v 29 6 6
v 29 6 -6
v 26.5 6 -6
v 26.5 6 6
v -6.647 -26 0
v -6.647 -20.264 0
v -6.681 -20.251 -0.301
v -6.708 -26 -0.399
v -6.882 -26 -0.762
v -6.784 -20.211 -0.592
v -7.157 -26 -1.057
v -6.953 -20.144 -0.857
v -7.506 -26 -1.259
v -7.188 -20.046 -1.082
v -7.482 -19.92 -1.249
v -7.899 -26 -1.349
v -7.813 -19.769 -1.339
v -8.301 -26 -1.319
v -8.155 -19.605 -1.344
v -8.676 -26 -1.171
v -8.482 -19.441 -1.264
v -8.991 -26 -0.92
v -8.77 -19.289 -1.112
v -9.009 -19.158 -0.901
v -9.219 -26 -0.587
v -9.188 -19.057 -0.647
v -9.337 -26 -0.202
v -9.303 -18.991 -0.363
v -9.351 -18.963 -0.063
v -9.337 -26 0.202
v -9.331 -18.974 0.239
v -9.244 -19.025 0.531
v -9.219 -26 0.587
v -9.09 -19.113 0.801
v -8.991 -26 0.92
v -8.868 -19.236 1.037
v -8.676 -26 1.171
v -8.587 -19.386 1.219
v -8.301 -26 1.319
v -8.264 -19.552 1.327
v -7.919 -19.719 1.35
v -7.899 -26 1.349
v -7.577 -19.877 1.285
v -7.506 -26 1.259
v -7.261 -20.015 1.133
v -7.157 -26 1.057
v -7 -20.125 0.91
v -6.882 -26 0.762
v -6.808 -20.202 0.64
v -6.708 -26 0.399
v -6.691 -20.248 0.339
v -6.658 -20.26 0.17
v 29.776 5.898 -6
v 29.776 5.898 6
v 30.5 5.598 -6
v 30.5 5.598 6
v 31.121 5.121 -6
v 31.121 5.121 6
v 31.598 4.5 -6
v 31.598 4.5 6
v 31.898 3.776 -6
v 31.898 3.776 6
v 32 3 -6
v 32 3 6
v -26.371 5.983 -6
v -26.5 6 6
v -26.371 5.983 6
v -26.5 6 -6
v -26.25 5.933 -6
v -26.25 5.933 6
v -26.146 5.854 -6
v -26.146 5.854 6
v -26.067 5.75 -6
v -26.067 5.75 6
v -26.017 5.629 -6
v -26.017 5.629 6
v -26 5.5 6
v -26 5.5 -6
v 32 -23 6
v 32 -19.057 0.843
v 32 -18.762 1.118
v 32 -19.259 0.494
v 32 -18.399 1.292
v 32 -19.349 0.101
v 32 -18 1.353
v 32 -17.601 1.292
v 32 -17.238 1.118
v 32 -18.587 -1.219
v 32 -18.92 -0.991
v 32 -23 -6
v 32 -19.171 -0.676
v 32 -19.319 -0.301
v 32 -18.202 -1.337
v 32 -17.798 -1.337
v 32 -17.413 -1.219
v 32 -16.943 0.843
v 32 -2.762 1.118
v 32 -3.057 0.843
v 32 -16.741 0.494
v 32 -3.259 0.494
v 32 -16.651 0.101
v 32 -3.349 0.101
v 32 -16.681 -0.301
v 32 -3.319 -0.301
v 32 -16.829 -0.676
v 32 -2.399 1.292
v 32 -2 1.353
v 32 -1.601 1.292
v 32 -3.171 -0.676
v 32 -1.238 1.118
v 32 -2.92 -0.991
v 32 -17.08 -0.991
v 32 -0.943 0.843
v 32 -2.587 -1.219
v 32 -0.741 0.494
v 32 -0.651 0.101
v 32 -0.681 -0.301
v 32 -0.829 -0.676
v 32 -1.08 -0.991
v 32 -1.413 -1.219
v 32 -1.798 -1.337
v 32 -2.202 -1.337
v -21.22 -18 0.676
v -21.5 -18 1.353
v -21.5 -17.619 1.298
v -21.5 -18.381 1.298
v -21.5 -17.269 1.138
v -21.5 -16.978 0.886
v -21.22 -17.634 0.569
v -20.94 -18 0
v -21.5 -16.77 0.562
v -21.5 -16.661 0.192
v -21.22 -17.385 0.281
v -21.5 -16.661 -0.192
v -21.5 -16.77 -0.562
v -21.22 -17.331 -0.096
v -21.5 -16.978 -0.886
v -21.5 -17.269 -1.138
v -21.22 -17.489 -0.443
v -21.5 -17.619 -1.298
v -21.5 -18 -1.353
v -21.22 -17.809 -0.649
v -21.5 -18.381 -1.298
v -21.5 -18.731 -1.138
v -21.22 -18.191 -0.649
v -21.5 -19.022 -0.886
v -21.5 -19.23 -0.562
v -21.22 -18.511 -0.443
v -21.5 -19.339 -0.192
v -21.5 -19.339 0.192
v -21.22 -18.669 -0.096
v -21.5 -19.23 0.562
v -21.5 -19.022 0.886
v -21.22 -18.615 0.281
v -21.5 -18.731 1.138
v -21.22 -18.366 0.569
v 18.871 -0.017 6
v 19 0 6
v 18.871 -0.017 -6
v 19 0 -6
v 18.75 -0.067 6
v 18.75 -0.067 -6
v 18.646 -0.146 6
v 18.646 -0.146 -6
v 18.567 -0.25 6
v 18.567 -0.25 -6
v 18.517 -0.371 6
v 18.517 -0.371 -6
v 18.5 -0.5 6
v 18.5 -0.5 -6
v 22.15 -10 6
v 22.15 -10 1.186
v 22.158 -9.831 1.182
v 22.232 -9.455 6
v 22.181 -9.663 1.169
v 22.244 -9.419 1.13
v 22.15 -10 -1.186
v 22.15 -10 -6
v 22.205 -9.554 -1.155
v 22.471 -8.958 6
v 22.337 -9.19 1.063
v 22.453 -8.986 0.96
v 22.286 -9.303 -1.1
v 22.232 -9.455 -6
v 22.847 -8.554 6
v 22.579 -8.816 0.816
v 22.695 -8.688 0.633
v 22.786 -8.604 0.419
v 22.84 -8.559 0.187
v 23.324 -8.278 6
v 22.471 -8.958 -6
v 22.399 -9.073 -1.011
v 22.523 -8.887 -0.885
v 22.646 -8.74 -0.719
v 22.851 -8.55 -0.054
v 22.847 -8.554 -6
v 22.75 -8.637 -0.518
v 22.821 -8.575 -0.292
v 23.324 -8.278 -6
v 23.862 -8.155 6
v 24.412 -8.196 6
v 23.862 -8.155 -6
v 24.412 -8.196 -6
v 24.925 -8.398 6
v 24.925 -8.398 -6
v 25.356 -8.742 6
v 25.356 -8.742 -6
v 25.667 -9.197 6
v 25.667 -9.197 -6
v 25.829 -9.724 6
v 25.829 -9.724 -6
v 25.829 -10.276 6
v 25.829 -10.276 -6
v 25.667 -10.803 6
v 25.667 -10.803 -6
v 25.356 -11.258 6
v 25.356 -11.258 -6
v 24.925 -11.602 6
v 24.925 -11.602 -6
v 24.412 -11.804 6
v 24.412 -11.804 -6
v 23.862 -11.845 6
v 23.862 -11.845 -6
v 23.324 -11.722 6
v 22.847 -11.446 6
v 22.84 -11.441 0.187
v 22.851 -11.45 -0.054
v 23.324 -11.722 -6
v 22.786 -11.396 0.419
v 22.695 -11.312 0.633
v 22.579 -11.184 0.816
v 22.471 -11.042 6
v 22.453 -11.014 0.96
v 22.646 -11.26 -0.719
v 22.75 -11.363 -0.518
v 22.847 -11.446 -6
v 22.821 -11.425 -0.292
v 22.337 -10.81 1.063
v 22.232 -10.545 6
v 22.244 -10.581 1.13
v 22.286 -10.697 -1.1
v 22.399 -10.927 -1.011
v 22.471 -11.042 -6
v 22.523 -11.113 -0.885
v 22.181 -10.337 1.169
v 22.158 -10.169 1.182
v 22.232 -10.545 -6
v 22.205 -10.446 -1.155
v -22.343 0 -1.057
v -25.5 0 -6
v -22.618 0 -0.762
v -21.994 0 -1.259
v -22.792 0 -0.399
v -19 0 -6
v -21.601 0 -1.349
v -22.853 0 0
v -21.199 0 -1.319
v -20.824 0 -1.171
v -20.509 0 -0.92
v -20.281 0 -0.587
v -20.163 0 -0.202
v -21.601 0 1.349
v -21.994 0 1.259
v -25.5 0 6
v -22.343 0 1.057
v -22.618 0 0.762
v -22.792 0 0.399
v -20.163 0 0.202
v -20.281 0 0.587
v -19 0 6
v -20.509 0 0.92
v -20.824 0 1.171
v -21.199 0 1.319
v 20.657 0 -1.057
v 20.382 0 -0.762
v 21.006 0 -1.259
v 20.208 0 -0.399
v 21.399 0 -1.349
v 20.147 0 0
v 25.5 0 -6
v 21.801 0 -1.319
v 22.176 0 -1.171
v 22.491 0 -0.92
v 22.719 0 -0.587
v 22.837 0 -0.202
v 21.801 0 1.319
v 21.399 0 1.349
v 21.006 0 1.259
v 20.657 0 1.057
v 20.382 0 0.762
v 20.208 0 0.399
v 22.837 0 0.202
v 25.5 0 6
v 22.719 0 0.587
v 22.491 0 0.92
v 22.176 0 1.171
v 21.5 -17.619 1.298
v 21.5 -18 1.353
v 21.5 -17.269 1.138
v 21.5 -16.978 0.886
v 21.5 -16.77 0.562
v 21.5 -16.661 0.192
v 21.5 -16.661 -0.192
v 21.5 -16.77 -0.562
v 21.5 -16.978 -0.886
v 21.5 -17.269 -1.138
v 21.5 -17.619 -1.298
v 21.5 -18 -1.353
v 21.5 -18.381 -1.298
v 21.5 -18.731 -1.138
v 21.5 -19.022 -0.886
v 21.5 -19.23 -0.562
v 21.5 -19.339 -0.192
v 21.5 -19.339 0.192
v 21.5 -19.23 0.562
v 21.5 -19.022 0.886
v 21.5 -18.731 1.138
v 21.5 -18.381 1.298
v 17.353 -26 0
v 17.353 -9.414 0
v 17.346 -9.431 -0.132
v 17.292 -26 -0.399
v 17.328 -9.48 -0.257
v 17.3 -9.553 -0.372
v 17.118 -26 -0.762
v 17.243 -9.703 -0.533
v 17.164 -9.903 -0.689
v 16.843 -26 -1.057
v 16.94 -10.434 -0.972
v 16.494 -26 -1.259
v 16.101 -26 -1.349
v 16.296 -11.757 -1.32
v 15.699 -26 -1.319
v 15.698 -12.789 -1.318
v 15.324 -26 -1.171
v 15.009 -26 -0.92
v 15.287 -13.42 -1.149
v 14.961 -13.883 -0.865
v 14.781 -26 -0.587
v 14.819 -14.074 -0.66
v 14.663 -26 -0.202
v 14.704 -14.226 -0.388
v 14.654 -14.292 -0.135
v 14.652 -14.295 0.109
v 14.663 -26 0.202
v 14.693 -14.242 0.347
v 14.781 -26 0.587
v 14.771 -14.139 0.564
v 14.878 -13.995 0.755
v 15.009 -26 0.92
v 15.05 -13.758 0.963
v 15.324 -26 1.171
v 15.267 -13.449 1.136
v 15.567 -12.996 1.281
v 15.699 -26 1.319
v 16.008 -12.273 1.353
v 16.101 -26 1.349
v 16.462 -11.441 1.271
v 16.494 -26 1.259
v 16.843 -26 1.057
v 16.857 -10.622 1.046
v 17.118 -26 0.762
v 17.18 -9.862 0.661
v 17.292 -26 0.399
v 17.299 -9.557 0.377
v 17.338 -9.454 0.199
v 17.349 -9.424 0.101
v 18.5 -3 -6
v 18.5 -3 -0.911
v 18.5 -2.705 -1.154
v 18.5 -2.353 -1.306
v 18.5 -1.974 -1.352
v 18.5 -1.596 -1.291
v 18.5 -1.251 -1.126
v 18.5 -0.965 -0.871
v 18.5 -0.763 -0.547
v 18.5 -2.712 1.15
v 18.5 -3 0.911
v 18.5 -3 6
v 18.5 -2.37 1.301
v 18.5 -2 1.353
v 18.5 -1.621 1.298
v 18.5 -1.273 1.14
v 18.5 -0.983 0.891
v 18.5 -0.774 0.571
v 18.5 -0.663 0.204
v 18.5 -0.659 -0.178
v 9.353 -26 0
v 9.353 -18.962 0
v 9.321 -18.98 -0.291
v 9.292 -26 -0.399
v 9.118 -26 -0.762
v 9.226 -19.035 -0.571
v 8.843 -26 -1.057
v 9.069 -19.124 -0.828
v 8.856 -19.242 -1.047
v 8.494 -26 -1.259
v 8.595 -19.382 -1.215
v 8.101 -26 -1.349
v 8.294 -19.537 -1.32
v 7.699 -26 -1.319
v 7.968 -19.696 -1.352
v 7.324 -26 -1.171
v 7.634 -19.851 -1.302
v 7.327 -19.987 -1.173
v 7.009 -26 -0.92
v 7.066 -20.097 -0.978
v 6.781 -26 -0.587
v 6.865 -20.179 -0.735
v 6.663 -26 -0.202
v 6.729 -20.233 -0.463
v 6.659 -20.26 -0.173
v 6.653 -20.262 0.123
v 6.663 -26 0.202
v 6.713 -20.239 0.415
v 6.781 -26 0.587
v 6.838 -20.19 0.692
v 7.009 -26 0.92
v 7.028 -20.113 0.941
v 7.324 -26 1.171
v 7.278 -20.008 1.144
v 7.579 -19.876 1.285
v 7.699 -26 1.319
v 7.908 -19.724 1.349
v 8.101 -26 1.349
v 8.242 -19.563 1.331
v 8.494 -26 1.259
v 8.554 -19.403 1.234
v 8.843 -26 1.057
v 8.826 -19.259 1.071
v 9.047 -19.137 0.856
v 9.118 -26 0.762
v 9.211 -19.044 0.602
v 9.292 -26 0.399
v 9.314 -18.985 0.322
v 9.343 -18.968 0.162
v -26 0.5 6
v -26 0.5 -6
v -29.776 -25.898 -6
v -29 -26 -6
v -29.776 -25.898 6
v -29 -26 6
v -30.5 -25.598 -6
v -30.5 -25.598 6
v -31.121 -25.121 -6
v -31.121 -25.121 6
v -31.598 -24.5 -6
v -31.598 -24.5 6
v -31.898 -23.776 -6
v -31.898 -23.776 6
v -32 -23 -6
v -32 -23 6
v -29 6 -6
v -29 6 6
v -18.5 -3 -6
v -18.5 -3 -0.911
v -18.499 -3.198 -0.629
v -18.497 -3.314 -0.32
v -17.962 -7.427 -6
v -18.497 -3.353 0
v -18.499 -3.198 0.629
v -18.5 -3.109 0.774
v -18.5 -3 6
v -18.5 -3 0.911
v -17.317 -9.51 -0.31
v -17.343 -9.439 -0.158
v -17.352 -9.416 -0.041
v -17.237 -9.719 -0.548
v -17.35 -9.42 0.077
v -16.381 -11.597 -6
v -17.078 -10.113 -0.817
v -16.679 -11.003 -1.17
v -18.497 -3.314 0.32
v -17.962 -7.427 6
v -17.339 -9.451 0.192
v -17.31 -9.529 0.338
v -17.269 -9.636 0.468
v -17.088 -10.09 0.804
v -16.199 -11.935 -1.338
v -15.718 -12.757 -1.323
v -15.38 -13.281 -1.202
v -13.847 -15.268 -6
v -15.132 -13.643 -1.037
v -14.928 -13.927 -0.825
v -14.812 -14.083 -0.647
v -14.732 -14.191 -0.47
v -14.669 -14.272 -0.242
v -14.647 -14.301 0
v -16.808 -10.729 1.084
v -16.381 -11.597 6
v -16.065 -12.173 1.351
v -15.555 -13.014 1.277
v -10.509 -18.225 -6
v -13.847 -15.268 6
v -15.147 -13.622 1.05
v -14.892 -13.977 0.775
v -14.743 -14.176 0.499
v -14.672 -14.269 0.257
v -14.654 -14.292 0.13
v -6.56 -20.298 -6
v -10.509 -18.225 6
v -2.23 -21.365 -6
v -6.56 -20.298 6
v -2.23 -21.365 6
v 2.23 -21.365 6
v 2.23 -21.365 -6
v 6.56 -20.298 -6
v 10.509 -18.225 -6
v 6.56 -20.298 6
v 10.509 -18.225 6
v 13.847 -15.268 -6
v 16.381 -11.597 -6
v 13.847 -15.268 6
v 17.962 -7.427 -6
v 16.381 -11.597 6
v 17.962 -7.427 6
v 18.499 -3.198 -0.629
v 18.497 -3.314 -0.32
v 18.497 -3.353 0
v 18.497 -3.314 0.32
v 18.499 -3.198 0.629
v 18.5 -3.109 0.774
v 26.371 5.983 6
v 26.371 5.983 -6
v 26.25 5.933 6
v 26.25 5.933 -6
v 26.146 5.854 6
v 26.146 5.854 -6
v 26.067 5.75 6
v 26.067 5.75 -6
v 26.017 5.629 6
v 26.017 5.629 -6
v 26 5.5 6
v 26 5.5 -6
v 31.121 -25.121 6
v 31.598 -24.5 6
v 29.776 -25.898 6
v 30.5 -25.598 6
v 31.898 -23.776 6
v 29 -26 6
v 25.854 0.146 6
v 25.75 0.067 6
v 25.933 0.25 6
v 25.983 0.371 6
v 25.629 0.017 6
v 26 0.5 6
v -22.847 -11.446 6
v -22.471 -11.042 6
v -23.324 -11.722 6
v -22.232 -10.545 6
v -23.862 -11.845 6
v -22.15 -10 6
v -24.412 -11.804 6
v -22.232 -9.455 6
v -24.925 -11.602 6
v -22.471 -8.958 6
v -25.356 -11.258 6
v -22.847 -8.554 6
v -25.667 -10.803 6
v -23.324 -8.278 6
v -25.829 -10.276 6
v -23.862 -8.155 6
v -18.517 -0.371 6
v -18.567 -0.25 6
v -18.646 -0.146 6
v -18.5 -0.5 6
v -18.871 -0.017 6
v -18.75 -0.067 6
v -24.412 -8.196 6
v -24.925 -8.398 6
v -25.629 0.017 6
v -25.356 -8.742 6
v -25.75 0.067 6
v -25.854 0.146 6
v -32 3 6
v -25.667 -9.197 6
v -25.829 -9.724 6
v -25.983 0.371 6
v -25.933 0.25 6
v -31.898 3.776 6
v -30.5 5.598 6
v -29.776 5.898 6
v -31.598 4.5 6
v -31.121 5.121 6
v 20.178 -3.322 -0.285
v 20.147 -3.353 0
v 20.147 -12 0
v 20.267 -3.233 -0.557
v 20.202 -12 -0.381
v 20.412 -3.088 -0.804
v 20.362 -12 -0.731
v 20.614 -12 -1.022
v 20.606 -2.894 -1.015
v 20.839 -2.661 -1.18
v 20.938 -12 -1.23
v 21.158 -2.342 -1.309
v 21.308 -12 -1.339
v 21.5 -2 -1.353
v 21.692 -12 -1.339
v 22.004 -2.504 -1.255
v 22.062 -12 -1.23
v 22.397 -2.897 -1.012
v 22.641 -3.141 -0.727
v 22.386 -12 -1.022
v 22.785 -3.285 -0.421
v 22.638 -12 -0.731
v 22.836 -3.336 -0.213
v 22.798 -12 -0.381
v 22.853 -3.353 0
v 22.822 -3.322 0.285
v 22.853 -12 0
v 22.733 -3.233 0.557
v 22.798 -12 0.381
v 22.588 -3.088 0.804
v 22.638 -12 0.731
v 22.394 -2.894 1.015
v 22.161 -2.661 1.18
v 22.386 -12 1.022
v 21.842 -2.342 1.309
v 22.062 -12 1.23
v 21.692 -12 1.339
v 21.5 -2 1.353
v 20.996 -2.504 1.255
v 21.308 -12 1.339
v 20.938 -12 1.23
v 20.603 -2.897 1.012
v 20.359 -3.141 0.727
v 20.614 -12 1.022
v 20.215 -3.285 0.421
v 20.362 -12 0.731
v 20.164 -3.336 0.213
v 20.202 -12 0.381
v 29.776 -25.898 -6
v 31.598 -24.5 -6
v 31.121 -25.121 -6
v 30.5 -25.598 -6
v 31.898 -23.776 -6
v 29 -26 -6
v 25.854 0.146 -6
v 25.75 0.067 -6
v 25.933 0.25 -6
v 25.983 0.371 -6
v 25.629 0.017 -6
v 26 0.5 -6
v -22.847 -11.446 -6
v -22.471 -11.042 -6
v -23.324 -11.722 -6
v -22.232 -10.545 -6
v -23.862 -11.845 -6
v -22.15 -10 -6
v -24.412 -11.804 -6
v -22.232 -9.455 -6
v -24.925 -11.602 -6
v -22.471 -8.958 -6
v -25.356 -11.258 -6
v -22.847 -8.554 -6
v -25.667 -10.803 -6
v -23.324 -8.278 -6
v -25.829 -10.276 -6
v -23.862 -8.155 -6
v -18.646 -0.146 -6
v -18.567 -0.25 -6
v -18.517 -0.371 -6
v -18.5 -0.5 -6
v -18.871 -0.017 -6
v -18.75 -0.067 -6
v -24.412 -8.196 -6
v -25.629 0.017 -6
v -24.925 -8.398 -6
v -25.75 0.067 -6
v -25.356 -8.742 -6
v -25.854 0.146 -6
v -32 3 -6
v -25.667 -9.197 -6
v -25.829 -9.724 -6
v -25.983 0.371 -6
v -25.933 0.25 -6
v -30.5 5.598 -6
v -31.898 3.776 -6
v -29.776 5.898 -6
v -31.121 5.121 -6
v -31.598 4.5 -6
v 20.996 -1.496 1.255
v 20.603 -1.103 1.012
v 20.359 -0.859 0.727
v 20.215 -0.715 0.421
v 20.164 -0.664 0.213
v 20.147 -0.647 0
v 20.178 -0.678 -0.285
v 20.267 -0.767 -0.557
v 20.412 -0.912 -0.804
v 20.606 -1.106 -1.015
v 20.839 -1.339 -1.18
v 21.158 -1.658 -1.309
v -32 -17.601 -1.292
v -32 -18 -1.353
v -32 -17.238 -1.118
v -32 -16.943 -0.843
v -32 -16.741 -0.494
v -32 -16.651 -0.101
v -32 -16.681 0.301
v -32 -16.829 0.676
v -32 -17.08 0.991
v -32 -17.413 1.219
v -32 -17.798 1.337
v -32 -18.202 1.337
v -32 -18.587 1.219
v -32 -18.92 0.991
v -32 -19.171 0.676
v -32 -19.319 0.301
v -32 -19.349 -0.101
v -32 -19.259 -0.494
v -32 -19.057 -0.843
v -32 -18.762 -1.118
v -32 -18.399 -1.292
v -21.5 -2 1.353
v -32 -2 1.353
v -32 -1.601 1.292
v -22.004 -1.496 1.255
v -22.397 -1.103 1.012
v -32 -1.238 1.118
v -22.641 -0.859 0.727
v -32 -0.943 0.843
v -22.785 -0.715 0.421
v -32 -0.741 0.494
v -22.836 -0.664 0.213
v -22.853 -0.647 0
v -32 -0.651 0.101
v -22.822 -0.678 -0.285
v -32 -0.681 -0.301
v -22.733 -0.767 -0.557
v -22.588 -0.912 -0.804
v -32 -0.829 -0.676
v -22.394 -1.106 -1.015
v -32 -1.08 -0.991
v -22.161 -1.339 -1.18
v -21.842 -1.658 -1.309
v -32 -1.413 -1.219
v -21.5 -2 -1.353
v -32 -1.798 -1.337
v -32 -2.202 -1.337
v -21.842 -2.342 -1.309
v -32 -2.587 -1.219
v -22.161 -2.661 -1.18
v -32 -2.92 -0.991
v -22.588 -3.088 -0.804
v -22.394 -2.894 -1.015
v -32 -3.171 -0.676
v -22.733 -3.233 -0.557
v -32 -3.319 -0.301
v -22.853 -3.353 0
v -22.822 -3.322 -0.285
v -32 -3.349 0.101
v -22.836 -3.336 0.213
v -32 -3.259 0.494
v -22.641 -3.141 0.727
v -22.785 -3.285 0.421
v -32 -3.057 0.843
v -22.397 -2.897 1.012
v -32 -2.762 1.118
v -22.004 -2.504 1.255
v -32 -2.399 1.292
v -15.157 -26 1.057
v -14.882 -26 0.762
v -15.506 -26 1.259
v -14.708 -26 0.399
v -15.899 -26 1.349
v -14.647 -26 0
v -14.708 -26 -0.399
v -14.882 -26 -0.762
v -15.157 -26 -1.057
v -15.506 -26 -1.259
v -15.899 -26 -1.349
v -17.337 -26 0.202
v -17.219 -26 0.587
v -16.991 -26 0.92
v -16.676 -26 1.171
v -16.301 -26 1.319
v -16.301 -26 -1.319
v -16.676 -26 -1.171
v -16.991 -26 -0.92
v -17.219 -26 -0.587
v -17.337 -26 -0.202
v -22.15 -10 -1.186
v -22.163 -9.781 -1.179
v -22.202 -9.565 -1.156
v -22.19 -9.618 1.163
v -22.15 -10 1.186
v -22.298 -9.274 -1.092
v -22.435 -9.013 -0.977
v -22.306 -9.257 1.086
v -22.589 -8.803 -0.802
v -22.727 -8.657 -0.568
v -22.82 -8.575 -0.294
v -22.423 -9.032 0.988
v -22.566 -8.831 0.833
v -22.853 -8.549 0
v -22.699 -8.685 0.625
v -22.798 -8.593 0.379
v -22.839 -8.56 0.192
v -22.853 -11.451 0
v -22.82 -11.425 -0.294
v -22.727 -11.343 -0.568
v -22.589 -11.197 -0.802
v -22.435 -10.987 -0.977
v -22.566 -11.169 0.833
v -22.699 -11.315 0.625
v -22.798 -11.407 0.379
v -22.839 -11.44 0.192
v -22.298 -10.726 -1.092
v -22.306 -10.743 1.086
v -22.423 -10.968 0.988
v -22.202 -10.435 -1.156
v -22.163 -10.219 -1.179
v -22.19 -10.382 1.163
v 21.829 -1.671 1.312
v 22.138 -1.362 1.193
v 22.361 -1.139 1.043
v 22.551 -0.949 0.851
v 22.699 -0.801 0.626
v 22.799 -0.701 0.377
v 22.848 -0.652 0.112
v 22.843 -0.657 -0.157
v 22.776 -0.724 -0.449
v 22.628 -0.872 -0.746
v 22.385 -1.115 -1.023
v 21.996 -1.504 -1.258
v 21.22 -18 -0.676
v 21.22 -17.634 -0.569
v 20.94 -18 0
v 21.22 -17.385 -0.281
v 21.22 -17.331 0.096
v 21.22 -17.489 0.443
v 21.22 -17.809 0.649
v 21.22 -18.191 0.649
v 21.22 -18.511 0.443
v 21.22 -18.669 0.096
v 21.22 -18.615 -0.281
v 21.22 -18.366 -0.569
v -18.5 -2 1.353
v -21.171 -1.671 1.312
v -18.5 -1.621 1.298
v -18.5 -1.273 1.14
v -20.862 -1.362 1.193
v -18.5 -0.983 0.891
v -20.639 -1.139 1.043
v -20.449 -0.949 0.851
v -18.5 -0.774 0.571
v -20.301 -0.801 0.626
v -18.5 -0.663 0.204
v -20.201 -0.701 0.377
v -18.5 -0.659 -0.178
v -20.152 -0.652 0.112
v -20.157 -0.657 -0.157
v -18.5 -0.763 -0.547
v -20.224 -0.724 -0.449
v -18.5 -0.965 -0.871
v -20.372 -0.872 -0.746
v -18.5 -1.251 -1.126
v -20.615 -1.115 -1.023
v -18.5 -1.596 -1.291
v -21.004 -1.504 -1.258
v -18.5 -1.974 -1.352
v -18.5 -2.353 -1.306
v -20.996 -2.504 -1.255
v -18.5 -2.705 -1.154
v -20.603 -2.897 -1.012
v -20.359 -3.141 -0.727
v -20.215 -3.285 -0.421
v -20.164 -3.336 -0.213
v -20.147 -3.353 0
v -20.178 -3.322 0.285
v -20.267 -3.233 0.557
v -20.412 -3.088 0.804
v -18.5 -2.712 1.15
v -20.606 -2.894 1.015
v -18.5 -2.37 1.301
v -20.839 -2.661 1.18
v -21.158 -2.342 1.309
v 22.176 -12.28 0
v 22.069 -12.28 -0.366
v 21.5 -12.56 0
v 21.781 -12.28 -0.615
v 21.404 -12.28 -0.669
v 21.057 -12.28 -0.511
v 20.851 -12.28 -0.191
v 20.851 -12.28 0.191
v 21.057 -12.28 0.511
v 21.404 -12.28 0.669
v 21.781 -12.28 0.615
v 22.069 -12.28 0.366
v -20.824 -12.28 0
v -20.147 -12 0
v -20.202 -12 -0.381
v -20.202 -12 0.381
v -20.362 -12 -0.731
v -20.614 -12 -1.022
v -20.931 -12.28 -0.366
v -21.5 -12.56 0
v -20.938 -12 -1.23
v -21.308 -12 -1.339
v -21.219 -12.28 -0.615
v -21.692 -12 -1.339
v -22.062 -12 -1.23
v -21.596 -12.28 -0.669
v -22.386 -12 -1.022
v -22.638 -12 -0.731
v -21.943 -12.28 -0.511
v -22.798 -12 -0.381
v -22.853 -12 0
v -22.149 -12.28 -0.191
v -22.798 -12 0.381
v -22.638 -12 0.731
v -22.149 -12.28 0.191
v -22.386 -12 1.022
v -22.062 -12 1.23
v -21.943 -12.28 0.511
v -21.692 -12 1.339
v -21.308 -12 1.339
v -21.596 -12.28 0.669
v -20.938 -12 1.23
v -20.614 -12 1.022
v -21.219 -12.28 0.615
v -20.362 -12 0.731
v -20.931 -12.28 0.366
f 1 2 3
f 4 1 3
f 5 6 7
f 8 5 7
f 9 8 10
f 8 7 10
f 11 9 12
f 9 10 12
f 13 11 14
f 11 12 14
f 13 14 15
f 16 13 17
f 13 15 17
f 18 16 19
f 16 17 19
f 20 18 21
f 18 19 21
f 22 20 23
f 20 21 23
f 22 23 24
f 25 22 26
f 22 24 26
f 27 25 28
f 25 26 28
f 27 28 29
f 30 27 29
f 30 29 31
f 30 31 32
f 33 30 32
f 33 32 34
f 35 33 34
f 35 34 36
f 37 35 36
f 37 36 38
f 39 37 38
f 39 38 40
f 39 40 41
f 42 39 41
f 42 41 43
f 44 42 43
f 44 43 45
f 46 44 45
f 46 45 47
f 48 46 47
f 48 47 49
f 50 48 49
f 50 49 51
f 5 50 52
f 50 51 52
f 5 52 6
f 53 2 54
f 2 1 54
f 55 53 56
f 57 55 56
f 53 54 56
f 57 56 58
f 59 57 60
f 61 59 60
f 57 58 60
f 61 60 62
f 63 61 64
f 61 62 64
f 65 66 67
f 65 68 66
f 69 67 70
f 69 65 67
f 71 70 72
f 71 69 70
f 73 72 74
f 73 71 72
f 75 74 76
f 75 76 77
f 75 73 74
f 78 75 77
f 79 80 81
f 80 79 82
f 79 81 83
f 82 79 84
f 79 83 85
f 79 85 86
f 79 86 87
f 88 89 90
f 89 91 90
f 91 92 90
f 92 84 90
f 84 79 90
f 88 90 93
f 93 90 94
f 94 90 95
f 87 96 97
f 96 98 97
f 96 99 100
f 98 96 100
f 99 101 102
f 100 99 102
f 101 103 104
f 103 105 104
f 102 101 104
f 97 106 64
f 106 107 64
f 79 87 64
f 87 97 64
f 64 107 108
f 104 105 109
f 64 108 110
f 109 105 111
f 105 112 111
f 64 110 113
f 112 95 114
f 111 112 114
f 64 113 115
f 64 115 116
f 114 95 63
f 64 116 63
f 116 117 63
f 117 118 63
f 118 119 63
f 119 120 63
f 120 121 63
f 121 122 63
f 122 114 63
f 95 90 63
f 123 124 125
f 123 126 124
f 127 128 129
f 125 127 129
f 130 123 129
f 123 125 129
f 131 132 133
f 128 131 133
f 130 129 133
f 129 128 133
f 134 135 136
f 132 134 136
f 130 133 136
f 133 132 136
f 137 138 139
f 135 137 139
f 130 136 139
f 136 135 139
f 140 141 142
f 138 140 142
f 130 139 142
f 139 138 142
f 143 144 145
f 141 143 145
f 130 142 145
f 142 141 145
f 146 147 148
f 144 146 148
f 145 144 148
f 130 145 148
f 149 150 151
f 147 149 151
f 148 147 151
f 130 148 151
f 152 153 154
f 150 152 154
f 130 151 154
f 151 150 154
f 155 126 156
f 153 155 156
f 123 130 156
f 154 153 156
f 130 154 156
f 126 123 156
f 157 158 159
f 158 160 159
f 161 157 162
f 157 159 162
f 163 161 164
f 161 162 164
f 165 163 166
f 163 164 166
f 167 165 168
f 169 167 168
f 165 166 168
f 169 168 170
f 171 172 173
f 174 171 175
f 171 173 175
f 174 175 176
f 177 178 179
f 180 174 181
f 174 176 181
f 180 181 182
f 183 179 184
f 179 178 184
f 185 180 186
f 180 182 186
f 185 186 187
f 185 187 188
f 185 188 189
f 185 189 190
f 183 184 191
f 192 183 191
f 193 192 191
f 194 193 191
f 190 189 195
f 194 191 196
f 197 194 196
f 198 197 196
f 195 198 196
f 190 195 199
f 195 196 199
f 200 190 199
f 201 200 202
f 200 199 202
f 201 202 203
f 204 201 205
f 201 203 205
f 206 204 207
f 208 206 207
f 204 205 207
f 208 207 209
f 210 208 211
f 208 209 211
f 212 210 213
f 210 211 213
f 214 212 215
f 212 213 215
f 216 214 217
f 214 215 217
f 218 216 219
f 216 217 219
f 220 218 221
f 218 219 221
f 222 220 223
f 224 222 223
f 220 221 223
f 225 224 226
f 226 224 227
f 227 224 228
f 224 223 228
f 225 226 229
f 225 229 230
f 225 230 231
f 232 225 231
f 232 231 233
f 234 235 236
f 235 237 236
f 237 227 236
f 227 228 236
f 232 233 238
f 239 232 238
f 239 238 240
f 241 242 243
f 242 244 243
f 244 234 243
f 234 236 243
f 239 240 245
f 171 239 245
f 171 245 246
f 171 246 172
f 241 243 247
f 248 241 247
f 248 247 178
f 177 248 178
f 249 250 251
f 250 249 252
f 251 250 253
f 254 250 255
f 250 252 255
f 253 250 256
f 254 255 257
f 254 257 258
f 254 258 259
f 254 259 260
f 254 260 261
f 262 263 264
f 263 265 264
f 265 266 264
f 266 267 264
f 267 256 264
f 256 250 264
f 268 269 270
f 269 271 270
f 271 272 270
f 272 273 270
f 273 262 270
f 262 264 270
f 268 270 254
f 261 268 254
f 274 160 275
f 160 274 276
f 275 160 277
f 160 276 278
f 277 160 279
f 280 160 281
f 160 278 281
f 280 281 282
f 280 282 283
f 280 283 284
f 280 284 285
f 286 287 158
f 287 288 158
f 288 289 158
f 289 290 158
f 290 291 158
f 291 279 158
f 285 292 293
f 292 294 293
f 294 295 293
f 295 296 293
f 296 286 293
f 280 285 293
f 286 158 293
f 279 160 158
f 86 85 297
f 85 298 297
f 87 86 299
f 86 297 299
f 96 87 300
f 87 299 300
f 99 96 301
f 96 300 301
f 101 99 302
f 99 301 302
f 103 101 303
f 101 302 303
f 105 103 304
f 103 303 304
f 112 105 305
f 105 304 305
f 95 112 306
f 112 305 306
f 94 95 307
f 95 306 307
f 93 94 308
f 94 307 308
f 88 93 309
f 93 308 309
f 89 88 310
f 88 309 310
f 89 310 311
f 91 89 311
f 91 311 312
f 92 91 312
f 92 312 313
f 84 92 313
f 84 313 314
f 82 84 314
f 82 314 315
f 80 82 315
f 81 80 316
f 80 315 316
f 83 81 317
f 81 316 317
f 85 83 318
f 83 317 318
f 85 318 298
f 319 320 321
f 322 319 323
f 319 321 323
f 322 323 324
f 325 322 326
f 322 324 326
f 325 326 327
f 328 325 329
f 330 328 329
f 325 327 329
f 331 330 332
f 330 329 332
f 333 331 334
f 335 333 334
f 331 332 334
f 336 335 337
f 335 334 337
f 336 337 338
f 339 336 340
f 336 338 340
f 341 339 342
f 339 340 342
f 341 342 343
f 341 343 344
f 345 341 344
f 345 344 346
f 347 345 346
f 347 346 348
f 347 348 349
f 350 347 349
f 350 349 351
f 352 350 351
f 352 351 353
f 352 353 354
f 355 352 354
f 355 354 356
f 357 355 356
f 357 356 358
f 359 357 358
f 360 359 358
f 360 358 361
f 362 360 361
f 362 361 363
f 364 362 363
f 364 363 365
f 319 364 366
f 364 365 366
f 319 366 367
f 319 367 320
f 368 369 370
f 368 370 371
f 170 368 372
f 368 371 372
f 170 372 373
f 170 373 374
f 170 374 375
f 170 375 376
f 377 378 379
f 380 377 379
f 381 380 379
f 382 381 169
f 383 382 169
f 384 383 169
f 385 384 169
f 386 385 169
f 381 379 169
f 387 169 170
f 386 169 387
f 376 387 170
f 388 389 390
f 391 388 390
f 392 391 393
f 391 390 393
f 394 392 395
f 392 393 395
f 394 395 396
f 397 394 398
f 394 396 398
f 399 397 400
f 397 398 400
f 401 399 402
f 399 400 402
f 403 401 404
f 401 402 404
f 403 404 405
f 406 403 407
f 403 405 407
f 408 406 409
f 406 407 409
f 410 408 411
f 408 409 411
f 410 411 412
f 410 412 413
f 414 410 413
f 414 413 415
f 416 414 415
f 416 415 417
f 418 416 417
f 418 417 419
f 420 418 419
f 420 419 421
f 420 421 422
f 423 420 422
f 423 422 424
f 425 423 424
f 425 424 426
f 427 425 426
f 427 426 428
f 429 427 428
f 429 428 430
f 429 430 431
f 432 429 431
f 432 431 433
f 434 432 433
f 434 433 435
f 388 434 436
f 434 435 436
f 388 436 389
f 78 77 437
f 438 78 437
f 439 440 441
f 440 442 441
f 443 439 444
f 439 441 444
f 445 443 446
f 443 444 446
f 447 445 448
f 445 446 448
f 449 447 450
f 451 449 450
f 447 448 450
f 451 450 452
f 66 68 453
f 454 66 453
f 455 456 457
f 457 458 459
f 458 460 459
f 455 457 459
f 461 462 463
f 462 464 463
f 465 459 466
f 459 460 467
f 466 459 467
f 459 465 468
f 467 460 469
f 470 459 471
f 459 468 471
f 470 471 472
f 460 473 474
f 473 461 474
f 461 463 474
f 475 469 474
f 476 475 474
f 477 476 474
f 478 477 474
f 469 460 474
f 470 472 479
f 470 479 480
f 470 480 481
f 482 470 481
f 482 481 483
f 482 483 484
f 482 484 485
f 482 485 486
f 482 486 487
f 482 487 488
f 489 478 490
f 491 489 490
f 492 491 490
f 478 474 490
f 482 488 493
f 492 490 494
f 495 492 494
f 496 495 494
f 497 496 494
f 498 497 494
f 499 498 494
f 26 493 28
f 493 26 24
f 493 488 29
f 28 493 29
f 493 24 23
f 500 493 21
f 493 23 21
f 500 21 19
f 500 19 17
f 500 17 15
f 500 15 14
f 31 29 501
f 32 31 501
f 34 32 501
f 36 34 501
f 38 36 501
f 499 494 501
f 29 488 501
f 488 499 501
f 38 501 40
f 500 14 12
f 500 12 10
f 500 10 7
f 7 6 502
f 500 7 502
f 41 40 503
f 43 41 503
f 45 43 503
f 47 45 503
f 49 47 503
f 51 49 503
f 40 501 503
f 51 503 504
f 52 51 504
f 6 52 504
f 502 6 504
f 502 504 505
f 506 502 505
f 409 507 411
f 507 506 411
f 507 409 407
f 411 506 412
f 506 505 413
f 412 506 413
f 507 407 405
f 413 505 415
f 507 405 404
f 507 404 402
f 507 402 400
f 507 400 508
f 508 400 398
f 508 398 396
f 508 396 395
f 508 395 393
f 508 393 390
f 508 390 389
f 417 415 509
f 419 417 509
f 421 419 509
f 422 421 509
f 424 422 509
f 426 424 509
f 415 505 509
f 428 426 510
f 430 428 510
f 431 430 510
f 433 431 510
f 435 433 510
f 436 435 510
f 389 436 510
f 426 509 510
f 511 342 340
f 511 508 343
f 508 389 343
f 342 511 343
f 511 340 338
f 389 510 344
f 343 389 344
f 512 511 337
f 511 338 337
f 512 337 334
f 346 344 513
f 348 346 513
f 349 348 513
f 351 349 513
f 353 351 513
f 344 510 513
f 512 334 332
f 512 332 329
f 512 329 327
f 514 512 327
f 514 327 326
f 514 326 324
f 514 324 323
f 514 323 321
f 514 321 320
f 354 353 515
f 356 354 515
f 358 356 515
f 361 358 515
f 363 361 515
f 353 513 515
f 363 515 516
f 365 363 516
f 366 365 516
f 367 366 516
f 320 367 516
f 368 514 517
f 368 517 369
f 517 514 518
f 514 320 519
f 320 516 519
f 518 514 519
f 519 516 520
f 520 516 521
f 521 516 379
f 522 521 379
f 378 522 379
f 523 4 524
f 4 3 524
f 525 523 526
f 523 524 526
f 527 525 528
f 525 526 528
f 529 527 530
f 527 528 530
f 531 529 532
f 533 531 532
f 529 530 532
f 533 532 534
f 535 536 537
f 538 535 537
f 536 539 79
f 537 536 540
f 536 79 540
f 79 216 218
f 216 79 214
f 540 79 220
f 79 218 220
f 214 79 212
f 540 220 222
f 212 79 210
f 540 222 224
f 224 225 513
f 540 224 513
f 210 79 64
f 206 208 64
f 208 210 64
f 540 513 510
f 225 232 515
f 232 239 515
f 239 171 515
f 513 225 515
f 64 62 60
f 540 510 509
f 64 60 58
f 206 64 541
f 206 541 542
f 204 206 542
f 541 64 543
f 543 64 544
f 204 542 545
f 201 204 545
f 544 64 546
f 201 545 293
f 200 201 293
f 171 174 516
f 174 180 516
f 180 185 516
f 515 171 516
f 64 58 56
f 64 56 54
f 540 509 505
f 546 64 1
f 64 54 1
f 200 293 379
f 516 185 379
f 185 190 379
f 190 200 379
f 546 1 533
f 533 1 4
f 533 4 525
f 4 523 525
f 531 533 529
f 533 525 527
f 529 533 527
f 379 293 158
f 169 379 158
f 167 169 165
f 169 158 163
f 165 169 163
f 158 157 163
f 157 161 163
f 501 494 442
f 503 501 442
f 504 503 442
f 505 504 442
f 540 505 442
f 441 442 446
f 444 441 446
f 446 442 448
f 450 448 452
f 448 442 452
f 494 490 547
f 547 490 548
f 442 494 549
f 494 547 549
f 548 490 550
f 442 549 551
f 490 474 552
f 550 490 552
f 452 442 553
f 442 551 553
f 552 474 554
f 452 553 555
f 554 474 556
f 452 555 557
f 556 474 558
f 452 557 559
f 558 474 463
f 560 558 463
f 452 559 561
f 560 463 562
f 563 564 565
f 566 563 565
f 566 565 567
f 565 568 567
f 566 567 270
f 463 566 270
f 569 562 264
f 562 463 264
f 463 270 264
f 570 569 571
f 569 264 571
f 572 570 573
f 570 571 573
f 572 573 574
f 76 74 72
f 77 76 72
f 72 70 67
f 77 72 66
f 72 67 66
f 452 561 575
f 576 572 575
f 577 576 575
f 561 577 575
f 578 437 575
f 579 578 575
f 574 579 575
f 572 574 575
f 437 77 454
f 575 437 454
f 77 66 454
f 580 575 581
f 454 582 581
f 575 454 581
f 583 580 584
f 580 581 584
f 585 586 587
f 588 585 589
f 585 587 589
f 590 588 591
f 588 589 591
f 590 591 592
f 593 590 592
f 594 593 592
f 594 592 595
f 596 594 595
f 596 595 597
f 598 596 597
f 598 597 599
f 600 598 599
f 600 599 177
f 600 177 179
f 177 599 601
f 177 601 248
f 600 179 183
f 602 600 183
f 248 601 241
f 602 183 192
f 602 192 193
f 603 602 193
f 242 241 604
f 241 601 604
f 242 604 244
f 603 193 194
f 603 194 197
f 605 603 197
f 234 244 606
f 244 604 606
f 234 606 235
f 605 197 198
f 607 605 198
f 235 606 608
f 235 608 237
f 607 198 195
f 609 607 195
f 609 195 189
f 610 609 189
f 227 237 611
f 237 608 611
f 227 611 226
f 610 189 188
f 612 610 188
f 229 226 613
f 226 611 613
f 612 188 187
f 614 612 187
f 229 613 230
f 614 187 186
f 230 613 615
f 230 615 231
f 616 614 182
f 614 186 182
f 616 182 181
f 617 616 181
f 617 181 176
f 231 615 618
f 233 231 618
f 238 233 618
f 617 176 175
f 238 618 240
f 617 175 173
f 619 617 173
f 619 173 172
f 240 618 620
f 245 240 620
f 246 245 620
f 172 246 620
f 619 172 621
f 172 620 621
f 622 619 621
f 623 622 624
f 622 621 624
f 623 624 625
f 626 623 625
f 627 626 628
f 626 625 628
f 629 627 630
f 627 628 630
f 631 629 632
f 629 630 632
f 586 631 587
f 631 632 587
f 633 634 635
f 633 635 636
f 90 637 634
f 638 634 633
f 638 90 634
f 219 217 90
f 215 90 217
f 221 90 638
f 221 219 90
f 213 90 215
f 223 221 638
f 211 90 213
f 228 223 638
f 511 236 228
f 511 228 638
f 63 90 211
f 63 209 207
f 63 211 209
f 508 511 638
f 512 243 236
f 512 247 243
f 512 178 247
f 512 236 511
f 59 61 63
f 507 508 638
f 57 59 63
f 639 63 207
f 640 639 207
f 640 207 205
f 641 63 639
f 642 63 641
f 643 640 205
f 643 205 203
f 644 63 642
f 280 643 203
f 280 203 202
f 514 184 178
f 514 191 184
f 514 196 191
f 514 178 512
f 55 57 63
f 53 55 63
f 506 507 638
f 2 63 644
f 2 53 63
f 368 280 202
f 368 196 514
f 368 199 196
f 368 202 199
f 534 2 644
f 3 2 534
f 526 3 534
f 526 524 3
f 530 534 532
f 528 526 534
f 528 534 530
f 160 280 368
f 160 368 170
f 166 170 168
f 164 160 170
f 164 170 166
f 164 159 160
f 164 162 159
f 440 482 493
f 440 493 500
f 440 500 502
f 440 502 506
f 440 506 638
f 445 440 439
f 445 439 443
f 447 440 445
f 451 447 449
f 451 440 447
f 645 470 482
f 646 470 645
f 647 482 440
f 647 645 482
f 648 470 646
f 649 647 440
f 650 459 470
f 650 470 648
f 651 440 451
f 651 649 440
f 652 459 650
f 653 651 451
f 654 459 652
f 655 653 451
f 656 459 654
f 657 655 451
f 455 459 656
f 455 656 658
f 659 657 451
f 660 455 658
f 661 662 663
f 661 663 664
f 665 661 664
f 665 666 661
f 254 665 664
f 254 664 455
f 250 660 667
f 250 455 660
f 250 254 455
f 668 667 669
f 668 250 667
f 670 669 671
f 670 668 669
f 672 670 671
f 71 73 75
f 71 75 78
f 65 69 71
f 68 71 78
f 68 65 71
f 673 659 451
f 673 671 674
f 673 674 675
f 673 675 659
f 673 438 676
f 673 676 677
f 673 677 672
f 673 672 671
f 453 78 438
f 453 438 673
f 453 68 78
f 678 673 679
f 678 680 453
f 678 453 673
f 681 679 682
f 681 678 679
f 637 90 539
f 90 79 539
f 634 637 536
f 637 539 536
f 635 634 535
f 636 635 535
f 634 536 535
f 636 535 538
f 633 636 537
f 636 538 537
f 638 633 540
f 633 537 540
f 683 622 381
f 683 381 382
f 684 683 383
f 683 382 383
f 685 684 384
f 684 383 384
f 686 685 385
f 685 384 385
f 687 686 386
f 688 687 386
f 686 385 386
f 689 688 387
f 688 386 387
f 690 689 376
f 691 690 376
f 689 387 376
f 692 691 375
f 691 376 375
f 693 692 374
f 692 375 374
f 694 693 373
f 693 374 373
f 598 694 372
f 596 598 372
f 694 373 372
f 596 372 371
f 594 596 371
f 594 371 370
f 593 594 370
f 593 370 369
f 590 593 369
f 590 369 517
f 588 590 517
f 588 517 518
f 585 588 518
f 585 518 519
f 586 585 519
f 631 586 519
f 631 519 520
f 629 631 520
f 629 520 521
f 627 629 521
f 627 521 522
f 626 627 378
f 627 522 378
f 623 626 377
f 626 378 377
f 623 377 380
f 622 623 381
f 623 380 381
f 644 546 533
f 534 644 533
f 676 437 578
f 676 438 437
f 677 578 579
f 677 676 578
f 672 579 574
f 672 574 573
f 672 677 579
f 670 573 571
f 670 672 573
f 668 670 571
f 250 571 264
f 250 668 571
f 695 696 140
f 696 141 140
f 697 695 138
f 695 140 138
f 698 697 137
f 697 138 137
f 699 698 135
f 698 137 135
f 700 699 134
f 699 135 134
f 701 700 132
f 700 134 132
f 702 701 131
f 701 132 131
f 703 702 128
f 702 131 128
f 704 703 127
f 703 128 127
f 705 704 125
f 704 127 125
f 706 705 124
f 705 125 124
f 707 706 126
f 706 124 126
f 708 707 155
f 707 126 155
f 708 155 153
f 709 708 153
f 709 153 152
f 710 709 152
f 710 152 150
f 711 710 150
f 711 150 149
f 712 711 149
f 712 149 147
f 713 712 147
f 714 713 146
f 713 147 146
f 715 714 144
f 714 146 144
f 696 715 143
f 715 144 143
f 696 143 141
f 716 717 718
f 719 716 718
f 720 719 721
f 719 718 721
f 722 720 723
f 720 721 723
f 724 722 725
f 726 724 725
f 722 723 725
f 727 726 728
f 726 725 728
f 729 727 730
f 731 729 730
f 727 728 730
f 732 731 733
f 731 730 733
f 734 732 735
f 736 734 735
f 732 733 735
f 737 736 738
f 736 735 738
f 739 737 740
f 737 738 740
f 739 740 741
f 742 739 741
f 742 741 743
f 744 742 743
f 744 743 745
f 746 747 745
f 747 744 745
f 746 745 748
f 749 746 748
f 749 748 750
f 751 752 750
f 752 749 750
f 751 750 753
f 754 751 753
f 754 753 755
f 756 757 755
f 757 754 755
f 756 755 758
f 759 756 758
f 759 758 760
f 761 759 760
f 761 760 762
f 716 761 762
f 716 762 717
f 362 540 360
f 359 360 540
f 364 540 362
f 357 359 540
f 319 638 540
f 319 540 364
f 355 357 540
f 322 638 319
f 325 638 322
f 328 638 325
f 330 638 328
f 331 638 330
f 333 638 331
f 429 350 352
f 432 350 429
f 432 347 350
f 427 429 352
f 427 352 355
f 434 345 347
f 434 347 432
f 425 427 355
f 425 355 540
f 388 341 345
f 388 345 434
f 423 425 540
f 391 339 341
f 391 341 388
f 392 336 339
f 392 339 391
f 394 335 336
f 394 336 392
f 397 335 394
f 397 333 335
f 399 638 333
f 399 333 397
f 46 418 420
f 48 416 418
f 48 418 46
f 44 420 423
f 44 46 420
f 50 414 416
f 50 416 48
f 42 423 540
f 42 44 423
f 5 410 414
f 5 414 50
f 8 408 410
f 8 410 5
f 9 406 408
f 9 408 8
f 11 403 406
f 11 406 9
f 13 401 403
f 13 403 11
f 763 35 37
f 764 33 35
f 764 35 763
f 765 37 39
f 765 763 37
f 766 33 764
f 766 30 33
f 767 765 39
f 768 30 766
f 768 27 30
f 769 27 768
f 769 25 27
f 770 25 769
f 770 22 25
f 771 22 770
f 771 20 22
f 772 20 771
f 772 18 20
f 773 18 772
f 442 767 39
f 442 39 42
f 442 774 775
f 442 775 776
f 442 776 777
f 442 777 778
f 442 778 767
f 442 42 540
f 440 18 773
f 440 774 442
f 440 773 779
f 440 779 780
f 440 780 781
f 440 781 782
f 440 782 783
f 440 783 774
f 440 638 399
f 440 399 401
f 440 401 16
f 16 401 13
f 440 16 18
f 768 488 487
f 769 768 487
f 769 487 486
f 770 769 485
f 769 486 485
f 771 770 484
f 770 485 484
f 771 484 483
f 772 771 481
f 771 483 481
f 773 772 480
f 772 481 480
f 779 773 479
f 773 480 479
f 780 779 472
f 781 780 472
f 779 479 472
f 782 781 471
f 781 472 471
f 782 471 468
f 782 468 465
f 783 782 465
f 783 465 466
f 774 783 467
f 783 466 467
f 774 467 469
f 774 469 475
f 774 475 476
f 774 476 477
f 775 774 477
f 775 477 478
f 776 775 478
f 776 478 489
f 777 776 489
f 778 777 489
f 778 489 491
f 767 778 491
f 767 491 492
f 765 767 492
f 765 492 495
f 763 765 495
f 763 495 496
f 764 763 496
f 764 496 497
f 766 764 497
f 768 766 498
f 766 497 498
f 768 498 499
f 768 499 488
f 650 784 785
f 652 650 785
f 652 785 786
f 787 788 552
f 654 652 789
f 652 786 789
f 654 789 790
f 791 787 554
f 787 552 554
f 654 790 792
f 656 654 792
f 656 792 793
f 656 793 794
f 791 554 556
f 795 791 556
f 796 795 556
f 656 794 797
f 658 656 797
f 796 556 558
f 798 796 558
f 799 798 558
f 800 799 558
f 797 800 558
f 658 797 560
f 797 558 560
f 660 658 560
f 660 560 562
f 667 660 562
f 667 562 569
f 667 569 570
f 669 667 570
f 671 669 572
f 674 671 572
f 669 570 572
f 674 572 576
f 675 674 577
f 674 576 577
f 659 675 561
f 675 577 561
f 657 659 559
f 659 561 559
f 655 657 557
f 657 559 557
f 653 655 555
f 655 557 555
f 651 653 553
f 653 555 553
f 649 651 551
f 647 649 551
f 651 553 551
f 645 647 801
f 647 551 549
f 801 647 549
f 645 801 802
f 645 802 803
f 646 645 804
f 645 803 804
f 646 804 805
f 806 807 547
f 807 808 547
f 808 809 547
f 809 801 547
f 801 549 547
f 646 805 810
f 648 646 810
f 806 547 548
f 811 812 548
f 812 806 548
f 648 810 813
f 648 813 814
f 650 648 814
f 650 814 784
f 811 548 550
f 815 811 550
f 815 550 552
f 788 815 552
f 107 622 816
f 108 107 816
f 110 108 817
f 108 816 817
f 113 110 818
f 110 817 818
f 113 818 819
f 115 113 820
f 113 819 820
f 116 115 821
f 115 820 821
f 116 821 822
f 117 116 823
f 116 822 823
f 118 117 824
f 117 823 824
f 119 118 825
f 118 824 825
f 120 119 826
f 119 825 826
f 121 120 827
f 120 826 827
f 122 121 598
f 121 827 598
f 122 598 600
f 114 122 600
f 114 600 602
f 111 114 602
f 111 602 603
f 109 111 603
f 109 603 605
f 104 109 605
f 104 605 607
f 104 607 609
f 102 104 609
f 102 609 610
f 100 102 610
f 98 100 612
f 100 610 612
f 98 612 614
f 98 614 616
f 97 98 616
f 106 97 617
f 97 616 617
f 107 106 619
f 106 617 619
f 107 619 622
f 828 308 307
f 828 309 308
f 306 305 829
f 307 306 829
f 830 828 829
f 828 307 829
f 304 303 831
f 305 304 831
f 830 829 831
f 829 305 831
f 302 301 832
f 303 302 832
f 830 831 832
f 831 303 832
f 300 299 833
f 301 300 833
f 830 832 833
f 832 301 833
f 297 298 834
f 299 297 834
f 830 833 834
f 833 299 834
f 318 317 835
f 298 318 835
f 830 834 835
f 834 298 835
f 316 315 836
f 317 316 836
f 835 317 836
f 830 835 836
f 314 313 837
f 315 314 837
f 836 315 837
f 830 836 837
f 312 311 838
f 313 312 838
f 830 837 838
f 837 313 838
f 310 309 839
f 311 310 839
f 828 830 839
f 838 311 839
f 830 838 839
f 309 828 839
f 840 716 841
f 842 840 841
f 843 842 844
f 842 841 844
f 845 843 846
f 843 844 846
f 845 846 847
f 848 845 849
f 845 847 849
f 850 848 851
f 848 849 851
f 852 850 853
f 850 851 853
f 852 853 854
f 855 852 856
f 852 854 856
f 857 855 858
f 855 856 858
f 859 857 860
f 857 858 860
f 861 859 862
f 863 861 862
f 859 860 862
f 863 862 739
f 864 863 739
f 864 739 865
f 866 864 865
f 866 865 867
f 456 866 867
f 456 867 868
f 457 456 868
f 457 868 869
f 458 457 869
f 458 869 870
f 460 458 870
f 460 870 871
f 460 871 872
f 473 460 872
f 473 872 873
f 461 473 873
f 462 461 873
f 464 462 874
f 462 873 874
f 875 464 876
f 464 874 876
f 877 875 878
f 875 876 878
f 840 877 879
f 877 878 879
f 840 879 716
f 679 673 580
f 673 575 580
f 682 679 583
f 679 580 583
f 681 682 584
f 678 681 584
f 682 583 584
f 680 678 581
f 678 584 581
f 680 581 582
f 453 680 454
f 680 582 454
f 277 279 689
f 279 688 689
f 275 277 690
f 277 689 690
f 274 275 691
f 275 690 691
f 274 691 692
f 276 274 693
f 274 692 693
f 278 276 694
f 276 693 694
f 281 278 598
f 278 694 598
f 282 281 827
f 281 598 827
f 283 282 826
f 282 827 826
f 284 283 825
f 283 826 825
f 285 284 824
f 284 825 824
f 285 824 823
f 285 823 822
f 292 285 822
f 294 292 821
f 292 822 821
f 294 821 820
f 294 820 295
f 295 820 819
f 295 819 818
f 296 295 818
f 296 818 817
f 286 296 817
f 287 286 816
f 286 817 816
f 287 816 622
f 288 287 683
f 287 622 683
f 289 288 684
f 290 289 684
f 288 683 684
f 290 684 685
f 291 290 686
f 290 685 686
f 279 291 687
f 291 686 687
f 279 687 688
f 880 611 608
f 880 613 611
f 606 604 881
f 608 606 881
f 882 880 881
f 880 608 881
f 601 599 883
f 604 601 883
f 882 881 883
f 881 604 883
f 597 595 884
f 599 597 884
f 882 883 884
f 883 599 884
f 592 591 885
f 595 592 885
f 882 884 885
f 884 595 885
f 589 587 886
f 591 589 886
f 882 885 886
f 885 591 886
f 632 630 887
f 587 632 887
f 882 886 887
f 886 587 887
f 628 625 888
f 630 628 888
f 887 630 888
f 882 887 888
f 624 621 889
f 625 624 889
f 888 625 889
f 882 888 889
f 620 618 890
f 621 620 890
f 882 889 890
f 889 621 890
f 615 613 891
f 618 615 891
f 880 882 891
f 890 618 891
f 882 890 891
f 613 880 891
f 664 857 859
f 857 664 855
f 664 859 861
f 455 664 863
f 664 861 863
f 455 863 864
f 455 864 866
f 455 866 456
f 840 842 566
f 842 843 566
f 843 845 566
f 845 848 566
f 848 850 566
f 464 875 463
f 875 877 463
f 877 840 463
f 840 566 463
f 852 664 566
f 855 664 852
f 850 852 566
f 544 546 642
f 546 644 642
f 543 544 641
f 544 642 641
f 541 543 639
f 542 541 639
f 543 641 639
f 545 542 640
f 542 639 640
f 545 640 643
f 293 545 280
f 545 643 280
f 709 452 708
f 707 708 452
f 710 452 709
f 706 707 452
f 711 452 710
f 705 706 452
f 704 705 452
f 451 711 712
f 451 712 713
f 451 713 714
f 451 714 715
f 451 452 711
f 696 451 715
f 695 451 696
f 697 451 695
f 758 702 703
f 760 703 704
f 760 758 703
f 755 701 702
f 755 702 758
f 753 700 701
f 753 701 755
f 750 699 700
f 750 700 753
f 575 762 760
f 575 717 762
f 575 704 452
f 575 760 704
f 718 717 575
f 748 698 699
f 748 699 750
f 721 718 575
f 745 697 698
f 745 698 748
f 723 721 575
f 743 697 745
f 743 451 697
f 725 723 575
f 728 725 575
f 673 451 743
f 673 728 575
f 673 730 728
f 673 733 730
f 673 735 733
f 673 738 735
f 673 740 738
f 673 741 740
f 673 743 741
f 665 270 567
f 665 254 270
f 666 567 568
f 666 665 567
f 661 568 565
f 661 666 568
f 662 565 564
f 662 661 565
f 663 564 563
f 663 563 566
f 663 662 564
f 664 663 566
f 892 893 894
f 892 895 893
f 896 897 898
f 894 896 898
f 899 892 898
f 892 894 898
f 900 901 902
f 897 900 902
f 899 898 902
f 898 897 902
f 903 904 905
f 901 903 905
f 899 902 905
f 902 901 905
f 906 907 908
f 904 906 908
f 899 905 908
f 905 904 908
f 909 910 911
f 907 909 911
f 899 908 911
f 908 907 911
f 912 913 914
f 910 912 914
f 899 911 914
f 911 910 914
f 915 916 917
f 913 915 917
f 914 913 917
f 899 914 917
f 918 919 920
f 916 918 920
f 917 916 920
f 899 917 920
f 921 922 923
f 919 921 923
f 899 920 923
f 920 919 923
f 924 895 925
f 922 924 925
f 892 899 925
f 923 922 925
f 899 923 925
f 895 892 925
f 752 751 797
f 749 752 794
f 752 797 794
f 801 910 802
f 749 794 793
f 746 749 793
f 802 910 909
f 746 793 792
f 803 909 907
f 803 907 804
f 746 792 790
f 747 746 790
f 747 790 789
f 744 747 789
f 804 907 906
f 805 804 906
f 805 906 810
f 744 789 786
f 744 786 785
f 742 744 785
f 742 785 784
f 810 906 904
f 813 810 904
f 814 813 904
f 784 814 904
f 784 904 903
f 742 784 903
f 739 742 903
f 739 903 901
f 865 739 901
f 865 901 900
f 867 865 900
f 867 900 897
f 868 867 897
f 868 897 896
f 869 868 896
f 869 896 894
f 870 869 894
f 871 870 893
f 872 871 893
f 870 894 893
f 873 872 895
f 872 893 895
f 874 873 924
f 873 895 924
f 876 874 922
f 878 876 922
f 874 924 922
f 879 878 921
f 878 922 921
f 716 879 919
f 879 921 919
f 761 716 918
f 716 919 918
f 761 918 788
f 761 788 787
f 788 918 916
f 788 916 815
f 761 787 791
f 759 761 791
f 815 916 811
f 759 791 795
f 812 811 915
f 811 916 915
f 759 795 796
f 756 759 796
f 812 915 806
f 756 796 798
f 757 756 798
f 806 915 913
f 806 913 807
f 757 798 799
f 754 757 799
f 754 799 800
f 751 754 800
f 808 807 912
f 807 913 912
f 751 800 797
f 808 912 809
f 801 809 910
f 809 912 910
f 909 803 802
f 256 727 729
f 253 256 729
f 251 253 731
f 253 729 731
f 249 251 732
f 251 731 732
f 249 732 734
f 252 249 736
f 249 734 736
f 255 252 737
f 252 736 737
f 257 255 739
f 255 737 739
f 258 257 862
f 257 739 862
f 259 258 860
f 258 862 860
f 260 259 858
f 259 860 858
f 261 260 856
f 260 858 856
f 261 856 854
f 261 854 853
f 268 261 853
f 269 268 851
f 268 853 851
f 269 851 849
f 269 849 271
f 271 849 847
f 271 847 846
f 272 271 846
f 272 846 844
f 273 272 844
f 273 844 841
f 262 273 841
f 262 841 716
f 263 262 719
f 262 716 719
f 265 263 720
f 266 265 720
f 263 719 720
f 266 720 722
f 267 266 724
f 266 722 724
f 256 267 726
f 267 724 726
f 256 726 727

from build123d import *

# Parameters (mm, degrees)
SKETCH1_W                  = 64
SKETCH1_H                  = 32
BOSS_EXTRUDE1_DEPTH        = 12
CUT_EXTRUDE1_DEPTH         = 43.941821107
SKETCH3_W                  = 7.5
SKETCH3_H                  = 6
CUT_EXTRUDE2_DEPTH         = 43.941821107
M2_5_CLEARANCE_HOLE1_D     = 2.7051
M2_5_CLEARANCE_HOLE1_DEPTH = 32
M2_5_CLEARANCE_HOLE2_D     = 2.7051
M2_5_CLEARANCE_HOLE2_DEPTH = 32
F_3_7_3_7_DIAMETER_HOLE1_D = 3.7
M2_5_CLEARANCE_HOLE3_D     = 2.7051
M2_5_CLEARANCE_HOLE3_DEPTH = 12
M2_5_CLEARANCE_HOLE3_TIP   = 0.560244554
F_3_7_3_7_DIAMETER_HOLE2_D = 3.7
M2_5_CLEARANCE_HOLE4_D     = 2.7051
M2_5_CLEARANCE_HOLE4_DEPTH = 74.5
M2_5_CLEARANCE_HOLE5_D     = 2.7051
M2_5_CLEARANCE_HOLE5_DEPTH = 10.5
M2_5_CLEARANCE_HOLE5_TIP   = 0.560244554
M2_5_CLEARANCE_HOLE6_D     = 2.7051
M2_5_CLEARANCE_HOLE6_DEPTH = 10.5
M2_5_CLEARANCE_HOLE6_TIP   = 0.560244554
FILLET1_R                  = 0.5
FILLET2_R                  = 3


with BuildPart() as part:
    # Sketch1 → Boss-Extrude1 (new body)
    with BuildSketch(Plane(origin=(0, 0, -6), x_dir=(-1, 0, 0), z_dir=(0, 0, -1))):
        with Locations((0, -10)):
            Rectangle(SKETCH1_W, SKETCH1_H)
    extrude(amount=-BOSS_EXTRUDE1_DEPTH)

    # Sketch2 → Cut-Extrude1 (cut, through all)
    with BuildSketch(Plane.XY.offset(6)):
        with BuildLine():
            Line((-26, 6), (-26, 0))
            Line((-26, 0), (-18.5, 0))
            Line((-18.5, 0), (-18.5, -3))
            ThreePointArc((-18.5, -3), (0, -21.5), (18.5, -3))
            Line((18.5, -3), (18.5, 6))
            Line((18.5, 6), (-26, 6))
        make_face()
    extrude(amount=-CUT_EXTRUDE1_DEPTH, mode=Mode.SUBTRACT)

    # Sketch3 → Cut-Extrude2 (cut, through all)
    with BuildSketch(Plane.XY.offset(6)):
        with Locations((22.25, 3)):
            Rectangle(SKETCH3_W, SKETCH3_H)
    extrude(amount=-CUT_EXTRUDE2_DEPTH, mode=Mode.SUBTRACT)

    # M2.5 Clearance Hole1
    with Locations(Plane(origin=(0, -26, 0), x_dir=(-1, 0, 0), z_dir=(0, -1, 0))):
        with Locations((8, 0), (-8, 0)):
            Hole(M2_5_CLEARANCE_HOLE1_D / 2, depth=M2_5_CLEARANCE_HOLE1_DEPTH)

    # M2.5 Clearance Hole2
    with Locations(Plane(origin=(0, -26, 0), x_dir=(-1, 0, 0), z_dir=(0, -1, 0))):
        with Locations((16, 0), (-16, 0)):
            Hole(M2_5_CLEARANCE_HOLE2_D / 2, depth=M2_5_CLEARANCE_HOLE2_DEPTH)

    # Ø3.7 (3.7) Diameter Hole1 (through all)
    with Locations(Plane(origin=(0, 0, -6), x_dir=(-1, 0, 0), z_dir=(0, 0, -1))):
        with Locations((24, -10)):
            Hole(F_3_7_3_7_DIAMETER_HOLE1_D / 2)

    # M2.5 Clearance Hole3
    with Locations(Plane(origin=(0, 0, 0), x_dir=(1, 0, 0), z_dir=(0, 1, 0))):
        with Locations((21.5, 0), (-21.5, 0)):
            Hole(M2_5_CLEARANCE_HOLE3_D / 2, depth=M2_5_CLEARANCE_HOLE3_DEPTH)
            with Locations((0, 0, -(M2_5_CLEARANCE_HOLE3_DEPTH + M2_5_CLEARANCE_HOLE3_TIP / 2))):  # 135° drill point
                Cone(0, M2_5_CLEARANCE_HOLE3_D / 2, M2_5_CLEARANCE_HOLE3_TIP, mode=Mode.SUBTRACT)

    # Ø3.7 (3.7) Diameter Hole2 (through all)
    with Locations(Plane.XY.offset(6)):
        with Locations((24, -10)):
            Hole(F_3_7_3_7_DIAMETER_HOLE2_D / 2)

    # M2.5 Clearance Hole4
    with Locations(Plane(origin=(32, 0, 0), x_dir=(0, 0, -1), z_dir=(1, 0, 0))):
        with Locations((0, -2)):
            Hole(M2_5_CLEARANCE_HOLE4_D / 2, depth=M2_5_CLEARANCE_HOLE4_DEPTH)

    # M2.5 Clearance Hole5
    with Locations(Plane(origin=(32, 0, 0), x_dir=(0, 0, -1), z_dir=(1, 0, 0))):
        with Locations((0, -18)):
            Hole(M2_5_CLEARANCE_HOLE5_D / 2, depth=M2_5_CLEARANCE_HOLE5_DEPTH)
            with Locations((0, 0, -(M2_5_CLEARANCE_HOLE5_DEPTH + M2_5_CLEARANCE_HOLE5_TIP / 2))):  # 135° drill point
                Cone(0, M2_5_CLEARANCE_HOLE5_D / 2, M2_5_CLEARANCE_HOLE5_TIP, mode=Mode.SUBTRACT)

    # M2.5 Clearance Hole6
    with Locations(Plane.ZY.offset(32)):
        with Locations((0, -18)):
            Hole(M2_5_CLEARANCE_HOLE6_D / 2, depth=M2_5_CLEARANCE_HOLE6_DEPTH)
            with Locations((0, 0, -(M2_5_CLEARANCE_HOLE6_DEPTH + M2_5_CLEARANCE_HOLE6_TIP / 2))):  # 135° drill point
                Cone(0, M2_5_CLEARANCE_HOLE6_D / 2, M2_5_CLEARANCE_HOLE6_TIP, mode=Mode.SUBTRACT)

    # Fillet1
    fillet1_edges = [part.edges().sort_by_distance(p)[0] for p in [
        (-26, 6, 0),
        (-18.5, 0, 0),
        (-26, 0, 0),
        (18.5, 0, 0),
        (26, 6, 0),
        (26, 0, 0),
    ]]
    fillet(fillet1_edges, radius=FILLET1_R)

    # Fillet2
    fillet2_edges = [part.edges().sort_by_distance(p)[0] for p in [
        (32, -26, 0),
        (32, 6, 0),
        (-32, 6, 0),
        (-32, -26, 0),
    ]]
    fillet(fillet2_edges, radius=FILLET2_R)


solid = part.part
